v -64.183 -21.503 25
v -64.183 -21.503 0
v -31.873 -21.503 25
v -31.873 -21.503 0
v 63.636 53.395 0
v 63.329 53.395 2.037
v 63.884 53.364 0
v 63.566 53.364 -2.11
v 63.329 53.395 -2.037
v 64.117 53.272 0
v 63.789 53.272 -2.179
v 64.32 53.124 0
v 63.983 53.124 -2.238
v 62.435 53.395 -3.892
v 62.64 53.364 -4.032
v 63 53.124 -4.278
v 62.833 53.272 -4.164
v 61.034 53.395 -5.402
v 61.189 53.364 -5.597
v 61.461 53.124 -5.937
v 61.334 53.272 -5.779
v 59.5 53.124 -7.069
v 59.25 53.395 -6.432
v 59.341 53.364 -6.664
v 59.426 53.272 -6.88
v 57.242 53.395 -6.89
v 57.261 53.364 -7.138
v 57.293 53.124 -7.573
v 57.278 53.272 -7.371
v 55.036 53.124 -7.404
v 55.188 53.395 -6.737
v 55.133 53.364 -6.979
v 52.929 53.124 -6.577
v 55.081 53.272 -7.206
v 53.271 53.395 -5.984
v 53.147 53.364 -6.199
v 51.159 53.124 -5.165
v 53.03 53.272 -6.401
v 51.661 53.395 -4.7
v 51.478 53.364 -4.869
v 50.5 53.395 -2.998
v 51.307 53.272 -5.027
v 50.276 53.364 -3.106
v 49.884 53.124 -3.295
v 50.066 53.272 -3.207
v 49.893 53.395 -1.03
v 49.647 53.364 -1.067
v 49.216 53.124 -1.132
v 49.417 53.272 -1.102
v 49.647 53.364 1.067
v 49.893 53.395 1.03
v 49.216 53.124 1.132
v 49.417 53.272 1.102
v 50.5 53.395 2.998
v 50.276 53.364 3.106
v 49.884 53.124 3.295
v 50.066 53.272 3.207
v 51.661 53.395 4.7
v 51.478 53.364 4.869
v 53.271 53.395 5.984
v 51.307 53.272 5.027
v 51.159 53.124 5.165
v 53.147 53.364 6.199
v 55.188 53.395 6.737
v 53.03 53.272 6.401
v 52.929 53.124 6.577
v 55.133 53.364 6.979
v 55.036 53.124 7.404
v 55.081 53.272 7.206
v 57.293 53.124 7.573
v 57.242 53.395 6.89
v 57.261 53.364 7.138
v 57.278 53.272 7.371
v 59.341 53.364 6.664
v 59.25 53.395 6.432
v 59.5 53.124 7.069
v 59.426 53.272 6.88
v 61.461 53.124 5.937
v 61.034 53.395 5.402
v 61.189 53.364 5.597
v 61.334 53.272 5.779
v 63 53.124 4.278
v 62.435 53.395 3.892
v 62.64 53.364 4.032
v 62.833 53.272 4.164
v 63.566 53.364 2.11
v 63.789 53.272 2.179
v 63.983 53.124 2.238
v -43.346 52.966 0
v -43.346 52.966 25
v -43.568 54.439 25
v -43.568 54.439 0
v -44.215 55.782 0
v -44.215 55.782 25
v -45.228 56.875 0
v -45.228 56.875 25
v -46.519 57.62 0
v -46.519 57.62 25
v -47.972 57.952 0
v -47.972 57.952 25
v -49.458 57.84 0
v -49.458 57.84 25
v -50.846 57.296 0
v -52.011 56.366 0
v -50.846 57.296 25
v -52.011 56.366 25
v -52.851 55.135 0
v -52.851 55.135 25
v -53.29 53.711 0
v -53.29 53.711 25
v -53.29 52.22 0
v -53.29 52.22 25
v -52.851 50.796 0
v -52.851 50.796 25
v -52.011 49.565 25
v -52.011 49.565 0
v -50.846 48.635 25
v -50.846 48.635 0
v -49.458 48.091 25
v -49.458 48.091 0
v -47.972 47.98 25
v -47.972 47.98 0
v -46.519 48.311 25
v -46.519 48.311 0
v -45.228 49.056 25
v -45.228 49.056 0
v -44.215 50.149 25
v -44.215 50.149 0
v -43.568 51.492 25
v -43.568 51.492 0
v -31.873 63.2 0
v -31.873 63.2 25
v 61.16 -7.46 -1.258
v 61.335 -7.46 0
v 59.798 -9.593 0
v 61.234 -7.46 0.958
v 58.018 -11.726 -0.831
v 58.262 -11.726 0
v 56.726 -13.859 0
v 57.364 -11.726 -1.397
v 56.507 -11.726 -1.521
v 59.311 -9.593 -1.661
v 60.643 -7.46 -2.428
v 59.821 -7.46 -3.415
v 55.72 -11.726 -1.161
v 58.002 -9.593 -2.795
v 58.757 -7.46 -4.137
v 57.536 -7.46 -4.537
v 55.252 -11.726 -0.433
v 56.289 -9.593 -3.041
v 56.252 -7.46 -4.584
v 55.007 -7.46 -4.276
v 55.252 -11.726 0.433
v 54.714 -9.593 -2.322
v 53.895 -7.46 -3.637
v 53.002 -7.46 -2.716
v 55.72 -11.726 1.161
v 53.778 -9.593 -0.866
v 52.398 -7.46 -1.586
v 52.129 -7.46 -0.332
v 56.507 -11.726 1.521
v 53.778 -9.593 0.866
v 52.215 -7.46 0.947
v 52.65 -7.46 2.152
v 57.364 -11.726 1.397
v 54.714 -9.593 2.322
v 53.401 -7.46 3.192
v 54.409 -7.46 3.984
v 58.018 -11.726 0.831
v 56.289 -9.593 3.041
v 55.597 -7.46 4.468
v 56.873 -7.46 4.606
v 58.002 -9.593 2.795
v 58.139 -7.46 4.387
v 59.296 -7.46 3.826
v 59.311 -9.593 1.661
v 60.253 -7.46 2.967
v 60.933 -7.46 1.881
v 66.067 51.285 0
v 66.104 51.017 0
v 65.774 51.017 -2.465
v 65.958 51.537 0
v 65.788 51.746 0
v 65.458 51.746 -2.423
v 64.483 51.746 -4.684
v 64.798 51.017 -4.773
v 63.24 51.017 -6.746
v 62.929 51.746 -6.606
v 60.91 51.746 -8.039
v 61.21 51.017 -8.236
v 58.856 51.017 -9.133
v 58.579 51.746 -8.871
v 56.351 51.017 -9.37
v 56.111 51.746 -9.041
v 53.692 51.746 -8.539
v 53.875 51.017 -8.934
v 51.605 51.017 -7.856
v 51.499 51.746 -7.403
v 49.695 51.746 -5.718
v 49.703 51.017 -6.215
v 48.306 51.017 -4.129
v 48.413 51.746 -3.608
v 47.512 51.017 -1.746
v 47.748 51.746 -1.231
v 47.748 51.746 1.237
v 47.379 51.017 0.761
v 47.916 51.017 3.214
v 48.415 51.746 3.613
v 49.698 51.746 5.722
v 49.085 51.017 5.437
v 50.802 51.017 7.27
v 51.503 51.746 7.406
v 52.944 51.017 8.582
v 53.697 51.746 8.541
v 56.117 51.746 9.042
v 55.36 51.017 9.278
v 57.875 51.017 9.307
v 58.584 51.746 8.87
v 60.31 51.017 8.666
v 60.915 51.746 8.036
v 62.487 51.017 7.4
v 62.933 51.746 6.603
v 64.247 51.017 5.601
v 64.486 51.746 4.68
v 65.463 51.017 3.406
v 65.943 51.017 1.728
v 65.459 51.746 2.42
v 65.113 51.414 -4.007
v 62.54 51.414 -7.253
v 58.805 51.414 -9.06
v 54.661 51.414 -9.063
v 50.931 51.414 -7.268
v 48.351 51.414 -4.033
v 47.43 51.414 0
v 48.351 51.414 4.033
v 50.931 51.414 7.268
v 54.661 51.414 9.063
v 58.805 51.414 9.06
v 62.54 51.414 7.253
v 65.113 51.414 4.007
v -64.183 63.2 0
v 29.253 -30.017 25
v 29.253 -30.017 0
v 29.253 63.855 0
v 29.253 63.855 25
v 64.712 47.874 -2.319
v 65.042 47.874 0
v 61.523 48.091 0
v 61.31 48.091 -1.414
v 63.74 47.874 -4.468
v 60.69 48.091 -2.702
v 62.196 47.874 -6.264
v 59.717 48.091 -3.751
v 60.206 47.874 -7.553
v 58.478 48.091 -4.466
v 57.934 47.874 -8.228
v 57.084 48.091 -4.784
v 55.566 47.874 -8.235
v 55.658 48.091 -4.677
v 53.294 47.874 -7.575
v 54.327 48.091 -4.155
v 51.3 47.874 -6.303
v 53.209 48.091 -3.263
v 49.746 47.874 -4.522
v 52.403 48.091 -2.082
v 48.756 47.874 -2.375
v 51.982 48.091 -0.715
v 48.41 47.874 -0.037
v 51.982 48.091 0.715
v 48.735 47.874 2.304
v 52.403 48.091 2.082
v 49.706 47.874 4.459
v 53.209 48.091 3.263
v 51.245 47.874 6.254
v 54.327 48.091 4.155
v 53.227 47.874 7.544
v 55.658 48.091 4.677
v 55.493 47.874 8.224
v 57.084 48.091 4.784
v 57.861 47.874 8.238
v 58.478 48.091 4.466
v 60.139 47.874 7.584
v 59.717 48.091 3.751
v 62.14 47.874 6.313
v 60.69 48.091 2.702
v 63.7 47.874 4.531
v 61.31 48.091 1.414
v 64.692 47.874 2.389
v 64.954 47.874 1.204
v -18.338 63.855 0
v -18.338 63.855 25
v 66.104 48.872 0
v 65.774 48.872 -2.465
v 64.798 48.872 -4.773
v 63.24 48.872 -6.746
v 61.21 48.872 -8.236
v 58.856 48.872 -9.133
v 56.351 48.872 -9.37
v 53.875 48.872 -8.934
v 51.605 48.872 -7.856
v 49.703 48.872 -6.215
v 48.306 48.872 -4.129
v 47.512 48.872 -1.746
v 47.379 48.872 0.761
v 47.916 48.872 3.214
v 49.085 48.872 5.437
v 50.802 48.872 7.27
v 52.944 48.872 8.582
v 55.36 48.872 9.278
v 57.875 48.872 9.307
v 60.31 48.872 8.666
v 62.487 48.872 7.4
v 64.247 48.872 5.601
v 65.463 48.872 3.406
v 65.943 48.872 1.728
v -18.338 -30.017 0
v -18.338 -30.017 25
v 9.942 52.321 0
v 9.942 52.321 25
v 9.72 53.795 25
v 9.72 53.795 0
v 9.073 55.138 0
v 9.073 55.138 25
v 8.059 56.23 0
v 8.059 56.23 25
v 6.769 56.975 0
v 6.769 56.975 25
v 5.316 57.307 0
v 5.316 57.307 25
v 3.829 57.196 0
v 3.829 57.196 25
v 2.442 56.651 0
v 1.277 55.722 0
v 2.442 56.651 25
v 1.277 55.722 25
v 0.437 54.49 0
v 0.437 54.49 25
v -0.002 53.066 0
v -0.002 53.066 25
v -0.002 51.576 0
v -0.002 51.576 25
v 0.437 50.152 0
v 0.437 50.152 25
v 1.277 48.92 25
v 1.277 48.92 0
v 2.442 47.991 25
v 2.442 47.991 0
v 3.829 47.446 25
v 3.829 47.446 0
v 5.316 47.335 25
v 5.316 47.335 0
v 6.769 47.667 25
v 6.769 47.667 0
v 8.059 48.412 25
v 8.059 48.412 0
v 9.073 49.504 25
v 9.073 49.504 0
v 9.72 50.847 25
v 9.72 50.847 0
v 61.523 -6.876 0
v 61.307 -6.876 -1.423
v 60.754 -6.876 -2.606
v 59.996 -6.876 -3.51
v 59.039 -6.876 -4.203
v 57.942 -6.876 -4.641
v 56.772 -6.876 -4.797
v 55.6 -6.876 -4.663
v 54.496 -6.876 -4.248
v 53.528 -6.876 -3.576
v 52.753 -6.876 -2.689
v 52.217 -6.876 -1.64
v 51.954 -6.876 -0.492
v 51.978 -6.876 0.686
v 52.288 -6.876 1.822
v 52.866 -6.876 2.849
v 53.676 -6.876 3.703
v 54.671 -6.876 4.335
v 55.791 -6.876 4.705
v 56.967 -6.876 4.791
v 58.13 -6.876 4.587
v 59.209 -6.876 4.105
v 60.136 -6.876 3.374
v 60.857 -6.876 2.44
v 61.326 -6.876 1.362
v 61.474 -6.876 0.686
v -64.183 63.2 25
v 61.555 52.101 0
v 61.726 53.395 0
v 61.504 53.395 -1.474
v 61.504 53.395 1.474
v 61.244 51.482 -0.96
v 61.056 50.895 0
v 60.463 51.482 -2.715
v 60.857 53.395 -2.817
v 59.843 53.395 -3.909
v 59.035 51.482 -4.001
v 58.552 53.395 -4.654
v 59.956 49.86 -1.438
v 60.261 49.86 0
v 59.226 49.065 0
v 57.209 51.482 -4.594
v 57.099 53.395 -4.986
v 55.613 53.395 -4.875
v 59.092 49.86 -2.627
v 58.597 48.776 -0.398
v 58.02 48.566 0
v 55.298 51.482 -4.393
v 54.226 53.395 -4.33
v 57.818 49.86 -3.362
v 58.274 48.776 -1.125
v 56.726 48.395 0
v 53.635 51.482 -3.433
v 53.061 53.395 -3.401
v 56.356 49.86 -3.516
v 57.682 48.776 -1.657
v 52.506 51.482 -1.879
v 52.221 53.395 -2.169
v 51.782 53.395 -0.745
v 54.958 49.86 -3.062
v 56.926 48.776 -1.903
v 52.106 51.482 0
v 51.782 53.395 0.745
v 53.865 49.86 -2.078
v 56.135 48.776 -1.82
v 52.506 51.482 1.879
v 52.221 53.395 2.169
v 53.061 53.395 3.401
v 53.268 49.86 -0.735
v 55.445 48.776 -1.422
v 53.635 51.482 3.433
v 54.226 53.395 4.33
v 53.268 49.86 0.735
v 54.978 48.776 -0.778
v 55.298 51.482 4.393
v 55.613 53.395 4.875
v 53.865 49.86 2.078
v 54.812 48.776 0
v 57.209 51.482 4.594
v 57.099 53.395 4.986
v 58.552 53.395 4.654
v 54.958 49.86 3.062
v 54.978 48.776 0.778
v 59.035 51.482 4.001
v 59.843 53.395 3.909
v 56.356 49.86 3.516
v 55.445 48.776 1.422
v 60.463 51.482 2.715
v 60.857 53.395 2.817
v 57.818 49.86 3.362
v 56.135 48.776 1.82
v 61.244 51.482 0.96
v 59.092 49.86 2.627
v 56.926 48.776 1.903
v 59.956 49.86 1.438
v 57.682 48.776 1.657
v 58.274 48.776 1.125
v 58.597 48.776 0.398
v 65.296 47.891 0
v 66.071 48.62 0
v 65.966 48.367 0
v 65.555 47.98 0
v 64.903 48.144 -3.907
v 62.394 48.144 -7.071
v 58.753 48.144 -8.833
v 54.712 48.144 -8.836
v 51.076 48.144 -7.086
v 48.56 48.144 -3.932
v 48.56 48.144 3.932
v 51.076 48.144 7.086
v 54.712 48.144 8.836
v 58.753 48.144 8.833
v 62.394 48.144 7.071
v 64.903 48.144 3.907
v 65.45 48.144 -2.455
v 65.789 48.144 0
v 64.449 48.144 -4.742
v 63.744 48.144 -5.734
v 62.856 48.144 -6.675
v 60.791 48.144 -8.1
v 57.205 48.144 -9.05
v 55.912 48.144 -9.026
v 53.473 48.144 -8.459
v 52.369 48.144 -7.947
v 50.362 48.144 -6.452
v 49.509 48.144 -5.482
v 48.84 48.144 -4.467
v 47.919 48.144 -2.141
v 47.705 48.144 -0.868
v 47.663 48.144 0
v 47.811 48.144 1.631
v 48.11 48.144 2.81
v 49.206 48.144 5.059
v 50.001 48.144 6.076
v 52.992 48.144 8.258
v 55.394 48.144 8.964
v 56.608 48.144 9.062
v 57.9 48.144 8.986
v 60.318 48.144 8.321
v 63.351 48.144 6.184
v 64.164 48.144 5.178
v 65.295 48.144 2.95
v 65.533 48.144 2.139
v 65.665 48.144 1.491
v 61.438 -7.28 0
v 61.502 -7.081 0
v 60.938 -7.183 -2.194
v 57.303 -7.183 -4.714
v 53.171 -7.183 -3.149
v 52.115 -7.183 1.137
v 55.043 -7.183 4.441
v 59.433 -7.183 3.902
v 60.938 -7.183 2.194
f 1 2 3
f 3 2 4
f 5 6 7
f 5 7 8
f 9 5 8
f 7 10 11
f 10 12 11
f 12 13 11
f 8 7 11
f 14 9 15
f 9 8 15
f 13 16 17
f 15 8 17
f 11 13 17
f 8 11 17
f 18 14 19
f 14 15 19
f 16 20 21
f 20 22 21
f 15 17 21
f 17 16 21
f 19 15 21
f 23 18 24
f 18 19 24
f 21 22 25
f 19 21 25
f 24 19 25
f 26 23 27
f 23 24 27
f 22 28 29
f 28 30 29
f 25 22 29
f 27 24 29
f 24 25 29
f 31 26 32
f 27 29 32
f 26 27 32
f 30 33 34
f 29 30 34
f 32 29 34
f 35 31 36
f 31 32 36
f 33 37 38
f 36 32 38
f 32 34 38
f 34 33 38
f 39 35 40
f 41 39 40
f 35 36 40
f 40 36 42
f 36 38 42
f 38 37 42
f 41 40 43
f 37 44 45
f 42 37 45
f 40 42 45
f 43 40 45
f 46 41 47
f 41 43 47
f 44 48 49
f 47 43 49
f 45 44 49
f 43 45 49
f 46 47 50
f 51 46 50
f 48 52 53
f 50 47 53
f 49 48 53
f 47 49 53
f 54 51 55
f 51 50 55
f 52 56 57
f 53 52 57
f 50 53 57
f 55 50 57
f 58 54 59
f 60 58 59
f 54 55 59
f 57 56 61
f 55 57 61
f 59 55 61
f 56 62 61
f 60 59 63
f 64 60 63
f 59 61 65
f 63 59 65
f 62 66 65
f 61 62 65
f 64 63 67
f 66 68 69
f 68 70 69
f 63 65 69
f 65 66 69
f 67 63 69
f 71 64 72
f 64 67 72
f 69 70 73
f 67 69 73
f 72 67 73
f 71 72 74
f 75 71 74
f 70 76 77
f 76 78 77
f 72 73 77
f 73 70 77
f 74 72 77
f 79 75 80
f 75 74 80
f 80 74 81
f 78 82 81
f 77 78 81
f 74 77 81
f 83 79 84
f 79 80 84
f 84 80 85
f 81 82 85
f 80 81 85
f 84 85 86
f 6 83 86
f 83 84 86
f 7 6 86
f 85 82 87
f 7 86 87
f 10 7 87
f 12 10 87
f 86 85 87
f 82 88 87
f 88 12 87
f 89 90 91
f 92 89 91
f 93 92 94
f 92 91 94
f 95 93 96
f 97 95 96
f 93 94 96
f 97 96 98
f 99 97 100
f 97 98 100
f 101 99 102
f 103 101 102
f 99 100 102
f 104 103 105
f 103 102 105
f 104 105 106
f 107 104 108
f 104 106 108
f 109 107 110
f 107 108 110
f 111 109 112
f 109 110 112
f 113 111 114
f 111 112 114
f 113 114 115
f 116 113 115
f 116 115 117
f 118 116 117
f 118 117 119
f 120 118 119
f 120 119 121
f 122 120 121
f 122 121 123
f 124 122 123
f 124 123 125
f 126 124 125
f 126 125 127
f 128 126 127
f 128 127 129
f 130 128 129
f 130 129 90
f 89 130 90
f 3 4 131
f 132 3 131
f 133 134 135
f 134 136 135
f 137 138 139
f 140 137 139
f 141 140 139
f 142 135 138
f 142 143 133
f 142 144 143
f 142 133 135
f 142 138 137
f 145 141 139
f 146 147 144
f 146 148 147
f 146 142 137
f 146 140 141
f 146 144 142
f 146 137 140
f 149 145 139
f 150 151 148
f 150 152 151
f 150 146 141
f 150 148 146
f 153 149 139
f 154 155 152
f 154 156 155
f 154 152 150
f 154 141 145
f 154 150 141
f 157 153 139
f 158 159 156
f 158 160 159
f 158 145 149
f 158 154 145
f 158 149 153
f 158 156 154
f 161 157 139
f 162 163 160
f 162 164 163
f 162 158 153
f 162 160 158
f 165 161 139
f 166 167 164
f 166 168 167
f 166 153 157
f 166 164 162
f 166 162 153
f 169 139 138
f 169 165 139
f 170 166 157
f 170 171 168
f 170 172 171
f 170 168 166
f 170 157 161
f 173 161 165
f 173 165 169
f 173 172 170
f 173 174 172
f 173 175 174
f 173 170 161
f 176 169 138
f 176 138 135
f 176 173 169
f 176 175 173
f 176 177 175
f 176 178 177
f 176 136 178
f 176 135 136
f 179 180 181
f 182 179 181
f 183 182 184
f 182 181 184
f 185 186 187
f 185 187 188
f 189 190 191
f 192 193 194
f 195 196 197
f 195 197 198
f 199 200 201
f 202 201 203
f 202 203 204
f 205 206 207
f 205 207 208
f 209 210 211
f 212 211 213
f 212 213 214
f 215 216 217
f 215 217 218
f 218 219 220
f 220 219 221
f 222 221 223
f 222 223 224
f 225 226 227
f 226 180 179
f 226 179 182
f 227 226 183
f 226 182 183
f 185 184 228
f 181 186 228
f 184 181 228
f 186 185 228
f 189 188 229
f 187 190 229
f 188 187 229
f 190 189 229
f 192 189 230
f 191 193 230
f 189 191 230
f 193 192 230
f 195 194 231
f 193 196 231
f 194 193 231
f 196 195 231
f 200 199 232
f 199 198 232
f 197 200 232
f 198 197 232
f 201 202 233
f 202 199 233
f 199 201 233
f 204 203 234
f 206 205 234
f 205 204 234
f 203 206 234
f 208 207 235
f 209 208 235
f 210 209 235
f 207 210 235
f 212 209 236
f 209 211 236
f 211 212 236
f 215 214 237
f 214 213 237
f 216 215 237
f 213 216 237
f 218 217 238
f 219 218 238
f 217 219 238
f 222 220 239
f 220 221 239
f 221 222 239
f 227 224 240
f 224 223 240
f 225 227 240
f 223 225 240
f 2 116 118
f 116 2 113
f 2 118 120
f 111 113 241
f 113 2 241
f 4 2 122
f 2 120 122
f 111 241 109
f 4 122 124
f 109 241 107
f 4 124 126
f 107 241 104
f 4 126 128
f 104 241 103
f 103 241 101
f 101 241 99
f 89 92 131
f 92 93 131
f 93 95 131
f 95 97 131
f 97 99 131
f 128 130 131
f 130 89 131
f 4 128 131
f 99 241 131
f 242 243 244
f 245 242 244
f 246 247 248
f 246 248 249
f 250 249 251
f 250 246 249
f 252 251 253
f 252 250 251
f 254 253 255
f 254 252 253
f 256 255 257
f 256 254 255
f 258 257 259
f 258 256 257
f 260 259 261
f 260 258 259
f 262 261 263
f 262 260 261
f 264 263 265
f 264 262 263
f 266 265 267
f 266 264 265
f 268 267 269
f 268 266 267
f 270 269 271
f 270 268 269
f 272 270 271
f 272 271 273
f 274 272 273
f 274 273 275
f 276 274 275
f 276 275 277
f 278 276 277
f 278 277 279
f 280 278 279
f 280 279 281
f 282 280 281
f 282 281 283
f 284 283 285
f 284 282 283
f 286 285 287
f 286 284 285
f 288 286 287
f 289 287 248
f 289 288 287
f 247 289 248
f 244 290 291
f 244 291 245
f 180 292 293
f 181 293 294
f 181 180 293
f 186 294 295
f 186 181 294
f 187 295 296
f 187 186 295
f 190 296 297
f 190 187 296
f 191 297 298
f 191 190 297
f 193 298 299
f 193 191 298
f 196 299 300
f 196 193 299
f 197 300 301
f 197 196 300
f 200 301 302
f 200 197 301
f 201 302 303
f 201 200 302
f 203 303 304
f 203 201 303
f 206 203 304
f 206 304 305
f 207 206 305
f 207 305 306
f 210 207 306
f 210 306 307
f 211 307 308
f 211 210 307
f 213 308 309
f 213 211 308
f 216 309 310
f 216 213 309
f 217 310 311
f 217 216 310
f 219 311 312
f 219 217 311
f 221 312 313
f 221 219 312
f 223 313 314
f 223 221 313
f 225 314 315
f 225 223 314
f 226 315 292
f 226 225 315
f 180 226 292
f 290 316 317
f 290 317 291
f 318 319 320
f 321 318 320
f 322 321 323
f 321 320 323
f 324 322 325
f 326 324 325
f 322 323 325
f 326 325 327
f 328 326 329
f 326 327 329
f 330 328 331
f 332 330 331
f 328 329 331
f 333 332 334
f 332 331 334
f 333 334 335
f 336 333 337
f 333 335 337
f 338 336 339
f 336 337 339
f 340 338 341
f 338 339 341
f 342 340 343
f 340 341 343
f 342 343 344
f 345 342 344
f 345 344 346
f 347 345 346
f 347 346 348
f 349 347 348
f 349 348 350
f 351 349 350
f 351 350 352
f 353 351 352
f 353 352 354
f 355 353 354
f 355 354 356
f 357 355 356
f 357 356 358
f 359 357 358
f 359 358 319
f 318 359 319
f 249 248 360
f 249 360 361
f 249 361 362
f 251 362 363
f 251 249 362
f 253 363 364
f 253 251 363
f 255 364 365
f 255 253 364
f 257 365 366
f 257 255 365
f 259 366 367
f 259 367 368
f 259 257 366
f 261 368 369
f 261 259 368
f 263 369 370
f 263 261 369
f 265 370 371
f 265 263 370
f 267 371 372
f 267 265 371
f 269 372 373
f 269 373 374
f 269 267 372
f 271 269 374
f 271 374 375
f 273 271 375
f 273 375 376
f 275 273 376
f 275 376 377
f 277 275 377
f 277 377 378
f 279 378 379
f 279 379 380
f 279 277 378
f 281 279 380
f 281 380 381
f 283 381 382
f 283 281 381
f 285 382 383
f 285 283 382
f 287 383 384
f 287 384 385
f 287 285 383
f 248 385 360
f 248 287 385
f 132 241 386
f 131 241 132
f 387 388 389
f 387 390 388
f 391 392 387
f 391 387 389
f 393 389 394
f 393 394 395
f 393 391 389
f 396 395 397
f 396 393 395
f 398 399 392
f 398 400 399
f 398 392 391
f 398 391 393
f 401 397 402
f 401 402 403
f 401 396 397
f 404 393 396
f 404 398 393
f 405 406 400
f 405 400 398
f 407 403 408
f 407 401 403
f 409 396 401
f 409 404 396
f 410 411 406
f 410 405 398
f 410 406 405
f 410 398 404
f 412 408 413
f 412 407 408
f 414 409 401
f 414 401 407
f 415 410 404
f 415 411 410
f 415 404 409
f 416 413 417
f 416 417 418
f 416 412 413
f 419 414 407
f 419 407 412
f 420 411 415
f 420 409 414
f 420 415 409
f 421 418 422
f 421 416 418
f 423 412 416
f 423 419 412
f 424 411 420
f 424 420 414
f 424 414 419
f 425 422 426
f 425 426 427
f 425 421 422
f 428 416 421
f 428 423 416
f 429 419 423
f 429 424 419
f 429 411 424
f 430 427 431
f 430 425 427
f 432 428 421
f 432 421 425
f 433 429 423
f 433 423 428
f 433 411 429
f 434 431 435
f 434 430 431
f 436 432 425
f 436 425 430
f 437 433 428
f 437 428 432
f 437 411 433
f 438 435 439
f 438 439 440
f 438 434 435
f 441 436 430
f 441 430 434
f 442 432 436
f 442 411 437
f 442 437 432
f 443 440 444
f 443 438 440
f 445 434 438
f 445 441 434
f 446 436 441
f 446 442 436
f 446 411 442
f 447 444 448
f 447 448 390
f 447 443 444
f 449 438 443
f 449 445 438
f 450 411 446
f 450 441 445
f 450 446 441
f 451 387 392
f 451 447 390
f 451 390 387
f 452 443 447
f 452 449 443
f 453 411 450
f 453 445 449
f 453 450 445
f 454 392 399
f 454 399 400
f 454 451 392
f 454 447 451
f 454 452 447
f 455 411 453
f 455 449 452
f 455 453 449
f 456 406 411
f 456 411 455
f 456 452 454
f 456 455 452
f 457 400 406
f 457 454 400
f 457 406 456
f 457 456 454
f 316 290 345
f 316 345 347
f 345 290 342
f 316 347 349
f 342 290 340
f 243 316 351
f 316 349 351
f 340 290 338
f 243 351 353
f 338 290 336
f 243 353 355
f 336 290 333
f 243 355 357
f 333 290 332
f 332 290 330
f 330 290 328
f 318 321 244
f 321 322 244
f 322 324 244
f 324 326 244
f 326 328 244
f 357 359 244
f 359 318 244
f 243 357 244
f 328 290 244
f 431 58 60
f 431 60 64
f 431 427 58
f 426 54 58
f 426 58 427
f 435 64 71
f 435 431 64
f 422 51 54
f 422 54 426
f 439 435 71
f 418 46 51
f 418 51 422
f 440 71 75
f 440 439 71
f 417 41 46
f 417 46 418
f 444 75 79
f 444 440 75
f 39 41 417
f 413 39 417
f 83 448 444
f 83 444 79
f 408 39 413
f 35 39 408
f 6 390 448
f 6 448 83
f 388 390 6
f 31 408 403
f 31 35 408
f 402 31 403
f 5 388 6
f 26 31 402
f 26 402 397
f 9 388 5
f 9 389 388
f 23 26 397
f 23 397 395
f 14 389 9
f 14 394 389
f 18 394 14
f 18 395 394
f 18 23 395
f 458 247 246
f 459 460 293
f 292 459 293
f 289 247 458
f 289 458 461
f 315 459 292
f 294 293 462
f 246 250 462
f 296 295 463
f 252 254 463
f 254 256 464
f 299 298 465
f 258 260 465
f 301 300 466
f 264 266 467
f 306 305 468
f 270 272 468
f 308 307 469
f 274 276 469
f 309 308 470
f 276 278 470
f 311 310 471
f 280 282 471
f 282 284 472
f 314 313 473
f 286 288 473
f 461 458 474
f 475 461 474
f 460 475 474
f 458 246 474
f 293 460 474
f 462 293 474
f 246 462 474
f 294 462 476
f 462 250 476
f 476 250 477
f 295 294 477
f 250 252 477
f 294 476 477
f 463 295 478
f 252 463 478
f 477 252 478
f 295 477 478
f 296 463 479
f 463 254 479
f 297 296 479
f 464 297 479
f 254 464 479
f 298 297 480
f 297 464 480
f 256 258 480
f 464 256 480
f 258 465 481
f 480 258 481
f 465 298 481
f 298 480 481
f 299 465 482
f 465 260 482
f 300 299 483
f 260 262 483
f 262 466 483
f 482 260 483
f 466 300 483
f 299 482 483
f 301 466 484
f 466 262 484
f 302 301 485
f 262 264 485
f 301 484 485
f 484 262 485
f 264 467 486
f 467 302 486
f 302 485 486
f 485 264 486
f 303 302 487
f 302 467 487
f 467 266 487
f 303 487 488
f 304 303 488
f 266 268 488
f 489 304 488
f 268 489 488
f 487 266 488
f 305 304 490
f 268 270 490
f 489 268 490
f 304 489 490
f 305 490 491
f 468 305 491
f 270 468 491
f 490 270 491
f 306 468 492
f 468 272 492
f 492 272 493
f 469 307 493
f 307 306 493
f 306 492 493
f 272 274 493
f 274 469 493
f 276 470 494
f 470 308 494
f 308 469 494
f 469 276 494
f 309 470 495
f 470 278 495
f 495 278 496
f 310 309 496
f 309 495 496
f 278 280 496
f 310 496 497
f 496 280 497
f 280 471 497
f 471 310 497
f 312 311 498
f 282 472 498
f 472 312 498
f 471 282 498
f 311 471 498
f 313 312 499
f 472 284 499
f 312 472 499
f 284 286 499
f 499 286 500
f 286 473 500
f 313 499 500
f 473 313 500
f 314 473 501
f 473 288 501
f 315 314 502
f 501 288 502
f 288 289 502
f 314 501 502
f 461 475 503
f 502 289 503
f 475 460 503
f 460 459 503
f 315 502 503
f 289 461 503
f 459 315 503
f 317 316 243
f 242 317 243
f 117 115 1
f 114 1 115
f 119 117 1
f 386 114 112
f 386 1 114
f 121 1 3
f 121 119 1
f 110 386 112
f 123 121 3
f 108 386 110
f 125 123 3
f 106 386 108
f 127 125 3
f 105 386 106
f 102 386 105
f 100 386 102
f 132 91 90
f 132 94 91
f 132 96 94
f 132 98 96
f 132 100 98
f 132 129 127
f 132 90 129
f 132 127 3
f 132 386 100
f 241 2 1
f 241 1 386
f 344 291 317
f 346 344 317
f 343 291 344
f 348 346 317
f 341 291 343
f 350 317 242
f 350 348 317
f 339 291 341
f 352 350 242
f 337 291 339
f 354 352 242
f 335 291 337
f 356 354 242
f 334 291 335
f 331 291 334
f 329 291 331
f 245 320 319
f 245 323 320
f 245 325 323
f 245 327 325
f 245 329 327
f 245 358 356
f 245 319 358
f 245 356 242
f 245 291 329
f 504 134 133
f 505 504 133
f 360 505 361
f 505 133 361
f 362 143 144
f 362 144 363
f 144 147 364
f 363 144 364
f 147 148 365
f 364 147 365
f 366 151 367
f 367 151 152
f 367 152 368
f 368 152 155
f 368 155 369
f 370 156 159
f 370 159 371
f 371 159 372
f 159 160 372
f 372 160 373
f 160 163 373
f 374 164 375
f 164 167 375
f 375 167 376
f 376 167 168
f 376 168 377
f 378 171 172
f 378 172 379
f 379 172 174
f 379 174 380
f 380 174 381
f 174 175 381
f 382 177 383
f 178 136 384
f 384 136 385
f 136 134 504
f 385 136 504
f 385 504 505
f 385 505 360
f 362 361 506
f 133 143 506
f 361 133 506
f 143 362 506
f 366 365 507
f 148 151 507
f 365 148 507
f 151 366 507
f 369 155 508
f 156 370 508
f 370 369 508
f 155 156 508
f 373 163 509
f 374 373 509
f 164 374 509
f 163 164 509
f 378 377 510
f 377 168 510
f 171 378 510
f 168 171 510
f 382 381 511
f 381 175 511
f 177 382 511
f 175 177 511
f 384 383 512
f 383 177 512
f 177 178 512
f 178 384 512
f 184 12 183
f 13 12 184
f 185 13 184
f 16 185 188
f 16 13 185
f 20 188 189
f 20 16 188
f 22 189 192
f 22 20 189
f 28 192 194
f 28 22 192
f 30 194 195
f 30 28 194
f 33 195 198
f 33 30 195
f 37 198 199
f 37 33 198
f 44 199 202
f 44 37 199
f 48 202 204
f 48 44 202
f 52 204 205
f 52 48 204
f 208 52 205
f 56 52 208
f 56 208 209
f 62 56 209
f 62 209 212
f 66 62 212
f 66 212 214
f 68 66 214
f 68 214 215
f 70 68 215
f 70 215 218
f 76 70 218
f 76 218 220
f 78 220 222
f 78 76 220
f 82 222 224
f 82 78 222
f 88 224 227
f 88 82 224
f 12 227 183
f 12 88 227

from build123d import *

# Parameters (mm, degrees)
F0_W     = 32.3096290231
F0_H     = 84.7036316991
F2_DEPTH = 25
F1_W     = 47.5912187248
F1_H     = 93.8725806773
F3_DEPTH = 25
F4_R     = 5
F5_DEPTH = 30
F6_R     = 5
F7_DEPTH = 30
F10_R    = 1


with BuildPart() as f2:
    # F0 (on Top) → F2 (new body)
    with BuildSketch(Plane.XY):
        with Locations((-48.0278320611, 20.8484455943)):
            Rectangle(F0_W, F0_H)
    extrude(amount=F2_DEPTH)

    # F4 (on face) → F5 (cut)
    with BuildSketch(Plane.XY.offset(25)):
        with Locations((-48.3458414674, 52.9655553401)):
            Circle(F4_R)
    extrude(amount=-F5_DEPTH, mode=Mode.SUBTRACT)


with BuildPart() as f3:
    # F1 (on Top) → F3 (new body)
    with BuildSketch(Plane.XY):
        with Locations((5.4577058181, 16.9188957661)):
            Rectangle(F1_W, F1_H)
    extrude(amount=F3_DEPTH)

    # F6 (on face) → F7 (cut)
    with BuildSketch(Plane.XY.offset(25)):
        with Locations((4.94201947, 52.3209422827)):
            Circle(F6_R)
    extrude(amount=-F7_DEPTH, mode=Mode.SUBTRACT)


with BuildPart() as f9:
    # F8 (on Top) → F9 (revolve)
    with BuildSketch(Plane.XY):
        with BuildLine():
            Line((64.0313774347, 53.3952973783), (61.7257888615, 53.3952973783))
            ThreePointArc((61.7257888615, 53.3952973783), (60.2613227674, 49.8597634724), (56.7257888615, 48.3952973783))
            Line((56.7257888615, 48.3952973783), (56.7257888615, -13.859141618))
            Line((56.7257888615, -13.859141618), (61.5231853937, -7.1981586516))
            Line((61.5231853937, -7.1981586516), (61.5231853937, 48.0905712957))
            Line((61.5231853937, 48.0905712957), (66.1035810235, 47.8086620569))
            Line((66.1035810235, 47.8086620569), (66.1035810235, 51.4501150073))
            Line((66.1035810235, 51.4501150073), (64.0313774347, 53.3952973783))
        make_face()
    revolve(axis=Axis((56.7257888615, 19.7680778801, 0), (0, 1, 0)))

    # F10
    f10_edges = [f9.edges().sort_by_distance(p)[0] for p in [
        (47.347997, 51.450115, 0),
        (49.4202, 53.395297, 0),
        (47.347997, 47.808662, 0),
        (51.928392, -7.198159, 0),
    ]]
    fillet(f10_edges, radius=F10_R)


solid = Compound([f2.part, f3.part, f9.part])
